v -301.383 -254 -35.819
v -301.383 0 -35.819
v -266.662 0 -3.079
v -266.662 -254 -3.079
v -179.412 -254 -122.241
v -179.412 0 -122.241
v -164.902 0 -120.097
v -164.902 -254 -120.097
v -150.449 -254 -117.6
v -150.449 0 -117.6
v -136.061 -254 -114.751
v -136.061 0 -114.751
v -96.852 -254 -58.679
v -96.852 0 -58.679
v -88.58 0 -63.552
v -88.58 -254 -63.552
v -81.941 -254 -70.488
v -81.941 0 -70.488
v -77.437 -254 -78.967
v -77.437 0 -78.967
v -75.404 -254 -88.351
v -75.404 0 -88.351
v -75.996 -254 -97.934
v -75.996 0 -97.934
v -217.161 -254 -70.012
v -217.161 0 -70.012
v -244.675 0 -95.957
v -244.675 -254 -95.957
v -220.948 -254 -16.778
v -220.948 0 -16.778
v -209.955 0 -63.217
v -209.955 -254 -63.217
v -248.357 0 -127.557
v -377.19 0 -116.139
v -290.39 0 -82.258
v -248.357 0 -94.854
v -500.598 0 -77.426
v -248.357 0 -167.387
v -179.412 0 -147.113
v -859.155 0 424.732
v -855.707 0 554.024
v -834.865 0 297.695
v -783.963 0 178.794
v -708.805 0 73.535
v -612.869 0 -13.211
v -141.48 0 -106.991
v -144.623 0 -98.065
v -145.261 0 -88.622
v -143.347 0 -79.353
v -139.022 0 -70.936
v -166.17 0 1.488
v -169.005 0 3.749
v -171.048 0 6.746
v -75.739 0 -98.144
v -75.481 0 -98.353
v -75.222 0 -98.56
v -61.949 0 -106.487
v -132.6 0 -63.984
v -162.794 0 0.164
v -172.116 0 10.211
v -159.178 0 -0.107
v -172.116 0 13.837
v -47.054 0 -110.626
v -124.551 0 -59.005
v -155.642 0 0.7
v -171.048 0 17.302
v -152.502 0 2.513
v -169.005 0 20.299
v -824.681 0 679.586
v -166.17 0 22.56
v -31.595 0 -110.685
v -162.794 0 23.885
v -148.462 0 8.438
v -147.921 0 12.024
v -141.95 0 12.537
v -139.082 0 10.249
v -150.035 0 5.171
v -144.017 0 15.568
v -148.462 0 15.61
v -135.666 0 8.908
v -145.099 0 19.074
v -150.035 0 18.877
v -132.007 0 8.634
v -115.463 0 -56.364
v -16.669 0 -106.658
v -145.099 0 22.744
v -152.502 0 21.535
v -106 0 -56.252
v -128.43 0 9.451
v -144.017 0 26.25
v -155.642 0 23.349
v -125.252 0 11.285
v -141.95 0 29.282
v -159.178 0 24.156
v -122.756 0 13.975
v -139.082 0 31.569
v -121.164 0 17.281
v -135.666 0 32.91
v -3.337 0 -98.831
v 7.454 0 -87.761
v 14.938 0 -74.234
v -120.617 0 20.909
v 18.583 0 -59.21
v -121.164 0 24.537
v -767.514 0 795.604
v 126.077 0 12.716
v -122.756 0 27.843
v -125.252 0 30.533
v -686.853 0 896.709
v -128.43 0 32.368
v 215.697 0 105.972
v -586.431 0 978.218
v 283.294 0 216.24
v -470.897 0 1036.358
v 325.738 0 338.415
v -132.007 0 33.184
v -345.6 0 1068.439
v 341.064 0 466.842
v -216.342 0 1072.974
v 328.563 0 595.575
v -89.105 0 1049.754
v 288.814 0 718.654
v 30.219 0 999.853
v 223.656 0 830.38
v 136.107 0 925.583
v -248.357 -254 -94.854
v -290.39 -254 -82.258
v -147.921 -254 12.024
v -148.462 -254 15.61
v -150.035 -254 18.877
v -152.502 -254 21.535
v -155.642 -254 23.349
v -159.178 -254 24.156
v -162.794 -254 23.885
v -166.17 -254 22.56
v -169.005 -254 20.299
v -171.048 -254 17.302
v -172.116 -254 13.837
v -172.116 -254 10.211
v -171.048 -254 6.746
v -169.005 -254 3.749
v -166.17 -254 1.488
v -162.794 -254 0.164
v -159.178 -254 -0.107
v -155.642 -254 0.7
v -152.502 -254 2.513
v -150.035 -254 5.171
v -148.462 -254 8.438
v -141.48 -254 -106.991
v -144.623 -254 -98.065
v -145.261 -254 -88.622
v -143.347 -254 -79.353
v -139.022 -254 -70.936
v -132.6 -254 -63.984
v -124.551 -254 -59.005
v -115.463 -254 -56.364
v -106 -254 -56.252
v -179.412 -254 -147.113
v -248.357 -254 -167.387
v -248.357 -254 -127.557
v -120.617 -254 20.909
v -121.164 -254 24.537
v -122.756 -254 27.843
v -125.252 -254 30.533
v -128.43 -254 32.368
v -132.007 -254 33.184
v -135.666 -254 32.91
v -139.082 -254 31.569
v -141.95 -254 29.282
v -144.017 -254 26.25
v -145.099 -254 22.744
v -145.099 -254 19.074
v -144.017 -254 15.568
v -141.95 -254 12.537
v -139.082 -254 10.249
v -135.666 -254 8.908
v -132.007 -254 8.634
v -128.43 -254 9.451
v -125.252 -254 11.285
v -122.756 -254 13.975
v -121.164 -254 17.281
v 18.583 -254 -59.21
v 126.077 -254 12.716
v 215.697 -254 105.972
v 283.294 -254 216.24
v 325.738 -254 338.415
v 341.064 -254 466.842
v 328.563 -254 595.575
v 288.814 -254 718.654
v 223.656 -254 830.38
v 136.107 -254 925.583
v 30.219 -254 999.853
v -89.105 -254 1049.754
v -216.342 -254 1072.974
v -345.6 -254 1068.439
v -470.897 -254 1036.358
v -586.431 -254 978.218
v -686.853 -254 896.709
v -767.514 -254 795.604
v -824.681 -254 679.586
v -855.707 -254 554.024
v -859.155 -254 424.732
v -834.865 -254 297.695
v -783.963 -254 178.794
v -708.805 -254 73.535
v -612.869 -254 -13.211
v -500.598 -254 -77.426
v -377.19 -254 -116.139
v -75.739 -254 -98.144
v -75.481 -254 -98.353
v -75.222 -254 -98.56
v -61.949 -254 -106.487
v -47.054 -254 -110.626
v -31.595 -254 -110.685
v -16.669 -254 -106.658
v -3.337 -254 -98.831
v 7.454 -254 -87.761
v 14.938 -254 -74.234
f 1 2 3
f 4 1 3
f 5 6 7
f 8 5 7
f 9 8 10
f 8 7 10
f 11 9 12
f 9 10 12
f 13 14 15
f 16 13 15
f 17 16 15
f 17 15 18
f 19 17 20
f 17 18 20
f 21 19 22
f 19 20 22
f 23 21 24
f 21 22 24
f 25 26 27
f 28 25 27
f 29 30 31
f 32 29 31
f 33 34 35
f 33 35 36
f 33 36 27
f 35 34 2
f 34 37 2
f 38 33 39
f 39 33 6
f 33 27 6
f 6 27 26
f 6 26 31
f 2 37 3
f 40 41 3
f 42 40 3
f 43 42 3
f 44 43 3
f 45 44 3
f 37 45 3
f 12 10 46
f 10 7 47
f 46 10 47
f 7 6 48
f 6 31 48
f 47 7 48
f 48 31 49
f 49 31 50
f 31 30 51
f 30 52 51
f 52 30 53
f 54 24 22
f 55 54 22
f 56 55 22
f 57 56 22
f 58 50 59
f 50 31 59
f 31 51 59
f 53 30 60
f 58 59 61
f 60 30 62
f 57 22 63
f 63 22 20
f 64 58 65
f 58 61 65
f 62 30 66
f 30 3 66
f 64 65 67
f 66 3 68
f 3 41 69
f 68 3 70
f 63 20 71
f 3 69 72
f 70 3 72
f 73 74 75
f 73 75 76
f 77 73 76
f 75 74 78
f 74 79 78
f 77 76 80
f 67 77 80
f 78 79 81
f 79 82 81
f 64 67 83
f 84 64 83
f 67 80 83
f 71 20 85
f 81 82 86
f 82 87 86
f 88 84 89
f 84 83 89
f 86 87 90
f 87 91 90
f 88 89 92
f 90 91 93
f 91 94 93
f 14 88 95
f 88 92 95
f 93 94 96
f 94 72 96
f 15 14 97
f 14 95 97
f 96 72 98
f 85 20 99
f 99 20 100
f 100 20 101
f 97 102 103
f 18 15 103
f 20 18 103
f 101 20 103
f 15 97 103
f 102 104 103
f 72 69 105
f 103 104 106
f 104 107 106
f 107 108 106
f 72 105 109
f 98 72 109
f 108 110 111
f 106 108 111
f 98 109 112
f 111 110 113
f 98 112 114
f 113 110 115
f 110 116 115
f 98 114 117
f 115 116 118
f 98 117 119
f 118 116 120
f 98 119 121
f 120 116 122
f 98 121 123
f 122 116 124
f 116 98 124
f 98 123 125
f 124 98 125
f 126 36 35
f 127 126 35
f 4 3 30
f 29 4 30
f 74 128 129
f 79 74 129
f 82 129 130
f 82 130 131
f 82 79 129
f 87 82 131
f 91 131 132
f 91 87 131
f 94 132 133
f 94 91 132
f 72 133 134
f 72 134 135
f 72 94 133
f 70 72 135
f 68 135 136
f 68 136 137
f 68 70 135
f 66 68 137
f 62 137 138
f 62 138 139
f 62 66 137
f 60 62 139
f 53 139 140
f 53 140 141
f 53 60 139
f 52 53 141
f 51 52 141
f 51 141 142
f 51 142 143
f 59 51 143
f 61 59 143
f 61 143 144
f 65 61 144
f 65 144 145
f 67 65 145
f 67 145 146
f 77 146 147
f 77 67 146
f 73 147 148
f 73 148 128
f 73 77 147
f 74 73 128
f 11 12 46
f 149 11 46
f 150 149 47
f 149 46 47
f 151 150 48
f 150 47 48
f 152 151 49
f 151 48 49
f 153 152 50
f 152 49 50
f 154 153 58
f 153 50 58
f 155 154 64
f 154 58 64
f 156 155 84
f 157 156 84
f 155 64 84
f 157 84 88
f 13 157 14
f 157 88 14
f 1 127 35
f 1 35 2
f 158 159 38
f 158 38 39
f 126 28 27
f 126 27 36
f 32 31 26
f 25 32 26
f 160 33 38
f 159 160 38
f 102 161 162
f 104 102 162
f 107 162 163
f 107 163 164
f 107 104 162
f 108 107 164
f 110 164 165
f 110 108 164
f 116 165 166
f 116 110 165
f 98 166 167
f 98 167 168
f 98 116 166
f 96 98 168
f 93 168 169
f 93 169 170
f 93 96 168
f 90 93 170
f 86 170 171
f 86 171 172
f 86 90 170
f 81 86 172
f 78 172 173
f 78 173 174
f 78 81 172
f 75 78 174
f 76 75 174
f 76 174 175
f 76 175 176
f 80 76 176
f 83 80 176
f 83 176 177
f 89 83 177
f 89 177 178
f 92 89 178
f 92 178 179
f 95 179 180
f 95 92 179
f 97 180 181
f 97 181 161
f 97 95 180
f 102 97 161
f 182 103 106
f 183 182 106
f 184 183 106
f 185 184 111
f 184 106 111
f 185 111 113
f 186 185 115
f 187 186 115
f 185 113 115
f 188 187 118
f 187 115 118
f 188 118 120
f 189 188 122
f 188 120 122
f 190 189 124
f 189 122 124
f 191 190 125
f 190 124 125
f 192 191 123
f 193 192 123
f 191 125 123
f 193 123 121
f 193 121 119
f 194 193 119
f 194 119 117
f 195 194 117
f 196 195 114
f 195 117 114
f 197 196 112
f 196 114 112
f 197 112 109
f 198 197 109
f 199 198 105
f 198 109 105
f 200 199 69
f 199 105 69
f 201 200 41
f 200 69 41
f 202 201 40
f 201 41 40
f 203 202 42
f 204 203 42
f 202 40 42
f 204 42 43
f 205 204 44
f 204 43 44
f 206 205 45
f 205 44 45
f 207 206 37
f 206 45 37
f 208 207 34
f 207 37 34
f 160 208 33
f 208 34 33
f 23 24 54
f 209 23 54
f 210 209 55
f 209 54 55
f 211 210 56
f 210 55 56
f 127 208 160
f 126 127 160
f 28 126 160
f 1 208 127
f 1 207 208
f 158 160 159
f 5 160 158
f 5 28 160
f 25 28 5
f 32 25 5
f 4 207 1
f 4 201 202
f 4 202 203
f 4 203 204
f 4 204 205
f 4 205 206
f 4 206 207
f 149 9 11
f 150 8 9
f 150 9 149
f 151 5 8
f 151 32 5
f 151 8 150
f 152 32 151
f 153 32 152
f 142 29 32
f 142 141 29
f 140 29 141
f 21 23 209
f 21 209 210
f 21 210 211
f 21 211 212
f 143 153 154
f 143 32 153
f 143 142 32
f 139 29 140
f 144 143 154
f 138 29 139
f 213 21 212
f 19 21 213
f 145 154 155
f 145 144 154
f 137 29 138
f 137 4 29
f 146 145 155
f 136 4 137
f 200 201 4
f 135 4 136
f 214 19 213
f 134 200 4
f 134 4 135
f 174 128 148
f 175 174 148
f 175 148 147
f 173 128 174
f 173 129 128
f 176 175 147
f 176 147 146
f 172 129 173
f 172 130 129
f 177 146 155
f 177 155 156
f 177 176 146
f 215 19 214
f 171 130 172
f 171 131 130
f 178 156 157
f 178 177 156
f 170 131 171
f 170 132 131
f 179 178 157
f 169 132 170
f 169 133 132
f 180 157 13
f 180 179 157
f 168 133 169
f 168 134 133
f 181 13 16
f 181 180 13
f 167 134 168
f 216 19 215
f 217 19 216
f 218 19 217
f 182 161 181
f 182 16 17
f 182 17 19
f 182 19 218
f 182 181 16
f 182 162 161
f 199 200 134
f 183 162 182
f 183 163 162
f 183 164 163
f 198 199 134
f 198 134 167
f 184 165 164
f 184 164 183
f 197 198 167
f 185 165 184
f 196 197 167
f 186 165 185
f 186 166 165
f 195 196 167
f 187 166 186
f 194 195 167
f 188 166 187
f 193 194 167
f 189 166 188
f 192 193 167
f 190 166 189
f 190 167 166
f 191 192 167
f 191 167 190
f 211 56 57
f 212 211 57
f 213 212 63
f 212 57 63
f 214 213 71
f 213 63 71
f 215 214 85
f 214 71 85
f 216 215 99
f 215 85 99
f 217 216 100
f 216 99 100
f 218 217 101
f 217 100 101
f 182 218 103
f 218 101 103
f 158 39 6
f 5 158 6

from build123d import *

# Parameters (mm, degrees)
F0_R     = 12.1654817783
F0_R_2   = 12.3094418461
F1_DEPTH = 254


with BuildPart() as f1:
    # F0 (on Front) → F1 (new body)
    with BuildSketch(Plane.XZ):
        with BuildLine():
            Line((-244.6754564072, -95.9572500223), (-248.3565956354, -94.854135785))
            Line((-248.3565956354, -94.854135785), (-248.3565956354, -127.5566222325))
            ThreePointArc((-248.3565956354, -127.5566222325), (-213.8078944202, -125.8910654203), (-179.4121861458, -122.2411219335))
            Line((-179.4121861458, -122.2411219335), (-179.4121861458, -58.1807047129))
            Line((-179.4121861458, -58.1807047129), (-217.1610821121, -70.0124311765))
            Line((-217.1610821121, -70.0124311765), (-244.6754564072, -95.9572500223))
        make_face()
        with BuildLine():
            Line((-248.3565956354, -127.5566222325), (-248.3565956354, -94.854135785))
            Line((-248.3565956354, -94.854135785), (-290.3897309912, -82.2582117584))
            Line((-290.3897309912, -82.2582117584), (-301.3831531393, -35.8189695212))
            Line((-301.3831531393, -35.8189695212), (-266.6623007034, -3.0787655479))
            Line((-266.6623007034, -3.0787655479), (-220.9480261194, -16.7778038117))
            Line((-220.9480261194, -16.7778038117), (-209.9546039713, -63.2170460489))
            Line((-209.9546039713, -63.2170460489), (-217.1610821121, -70.0124311765))
            Line((-217.1610821121, -70.0124311765), (-179.4121861458, -58.1807047129))
            Line((-179.4121861458, -58.1807047129), (-179.4121861458, -122.2411219335))
            ThreePointArc((-179.4121861458, -122.2411219335), (-157.6679238797, -118.8925887902), (-136.0607594252, -114.7506013513))
            ThreePointArc((-136.0607594252, -114.7506013513), (-139.0216639455, -70.9358153589), (-96.8521743572, -58.6787123162))
            ThreePointArc((-96.8521743572, -58.6787123162), (-38.8407590079, 4.8396231382), (18.5831978775, -59.210298215))
            ThreePointArc((18.5831978775, -59.210298215), (-409.1140131264, 1055.7782487651), (-248.3565956354, -127.5566222325))
        make_face()
        with Locations((-160.0868552923, 12.0240524411)):
            Circle(F0_R, mode=Mode.SUBTRACT)
        with Locations((-132.9269260168, 20.9090542048)):
            Circle(F0_R_2, mode=Mode.SUBTRACT)
        with BuildLine():
            ThreePointArc((-179.4121861458, -122.2411219335), (-213.8078944202, -125.8910654203), (-248.3565956354, -127.5566222325))
            Line((-248.3565956354, -127.5566222325), (-248.3565956354, -167.3867851496))
            Line((-248.3565956354, -167.3867851496), (-179.4121861458, -147.1127271652))
            Line((-179.4121861458, -147.1127271652), (-179.4121861458, -122.2411219335))
        make_face()
        with BuildLine():
            ThreePointArc((-75.2215410202, -98.5602818592), (-27.4853011776, -80.873117917), (18.5831978775, -59.210298215))
            ThreePointArc((18.5831978775, -59.210298215), (-38.8407590079, 4.8396231382), (-96.8521743572, -58.6787123162))
            ThreePointArc((-96.8521743572, -58.6787123162), (-79.3970992955, -74.572736982), (-75.9955495596, -97.9335829616))
            ThreePointArc((-75.9955495596, -97.9335829616), (-75.60989028, -98.2485935492), (-75.2215410202, -98.5602818592))
        make_face()
        with BuildLine():
            ThreePointArc((-75.2215410202, -98.5602818592), (-16.6690404085, -106.6575382222), (18.5831978775, -59.210298215))
            ThreePointArc((18.5831978775, -59.210298215), (-27.4853011776, -80.873117917), (-75.2215410202, -98.5602818592))
        make_face()
    extrude(amount=F1_DEPTH)


solid = f1.part
